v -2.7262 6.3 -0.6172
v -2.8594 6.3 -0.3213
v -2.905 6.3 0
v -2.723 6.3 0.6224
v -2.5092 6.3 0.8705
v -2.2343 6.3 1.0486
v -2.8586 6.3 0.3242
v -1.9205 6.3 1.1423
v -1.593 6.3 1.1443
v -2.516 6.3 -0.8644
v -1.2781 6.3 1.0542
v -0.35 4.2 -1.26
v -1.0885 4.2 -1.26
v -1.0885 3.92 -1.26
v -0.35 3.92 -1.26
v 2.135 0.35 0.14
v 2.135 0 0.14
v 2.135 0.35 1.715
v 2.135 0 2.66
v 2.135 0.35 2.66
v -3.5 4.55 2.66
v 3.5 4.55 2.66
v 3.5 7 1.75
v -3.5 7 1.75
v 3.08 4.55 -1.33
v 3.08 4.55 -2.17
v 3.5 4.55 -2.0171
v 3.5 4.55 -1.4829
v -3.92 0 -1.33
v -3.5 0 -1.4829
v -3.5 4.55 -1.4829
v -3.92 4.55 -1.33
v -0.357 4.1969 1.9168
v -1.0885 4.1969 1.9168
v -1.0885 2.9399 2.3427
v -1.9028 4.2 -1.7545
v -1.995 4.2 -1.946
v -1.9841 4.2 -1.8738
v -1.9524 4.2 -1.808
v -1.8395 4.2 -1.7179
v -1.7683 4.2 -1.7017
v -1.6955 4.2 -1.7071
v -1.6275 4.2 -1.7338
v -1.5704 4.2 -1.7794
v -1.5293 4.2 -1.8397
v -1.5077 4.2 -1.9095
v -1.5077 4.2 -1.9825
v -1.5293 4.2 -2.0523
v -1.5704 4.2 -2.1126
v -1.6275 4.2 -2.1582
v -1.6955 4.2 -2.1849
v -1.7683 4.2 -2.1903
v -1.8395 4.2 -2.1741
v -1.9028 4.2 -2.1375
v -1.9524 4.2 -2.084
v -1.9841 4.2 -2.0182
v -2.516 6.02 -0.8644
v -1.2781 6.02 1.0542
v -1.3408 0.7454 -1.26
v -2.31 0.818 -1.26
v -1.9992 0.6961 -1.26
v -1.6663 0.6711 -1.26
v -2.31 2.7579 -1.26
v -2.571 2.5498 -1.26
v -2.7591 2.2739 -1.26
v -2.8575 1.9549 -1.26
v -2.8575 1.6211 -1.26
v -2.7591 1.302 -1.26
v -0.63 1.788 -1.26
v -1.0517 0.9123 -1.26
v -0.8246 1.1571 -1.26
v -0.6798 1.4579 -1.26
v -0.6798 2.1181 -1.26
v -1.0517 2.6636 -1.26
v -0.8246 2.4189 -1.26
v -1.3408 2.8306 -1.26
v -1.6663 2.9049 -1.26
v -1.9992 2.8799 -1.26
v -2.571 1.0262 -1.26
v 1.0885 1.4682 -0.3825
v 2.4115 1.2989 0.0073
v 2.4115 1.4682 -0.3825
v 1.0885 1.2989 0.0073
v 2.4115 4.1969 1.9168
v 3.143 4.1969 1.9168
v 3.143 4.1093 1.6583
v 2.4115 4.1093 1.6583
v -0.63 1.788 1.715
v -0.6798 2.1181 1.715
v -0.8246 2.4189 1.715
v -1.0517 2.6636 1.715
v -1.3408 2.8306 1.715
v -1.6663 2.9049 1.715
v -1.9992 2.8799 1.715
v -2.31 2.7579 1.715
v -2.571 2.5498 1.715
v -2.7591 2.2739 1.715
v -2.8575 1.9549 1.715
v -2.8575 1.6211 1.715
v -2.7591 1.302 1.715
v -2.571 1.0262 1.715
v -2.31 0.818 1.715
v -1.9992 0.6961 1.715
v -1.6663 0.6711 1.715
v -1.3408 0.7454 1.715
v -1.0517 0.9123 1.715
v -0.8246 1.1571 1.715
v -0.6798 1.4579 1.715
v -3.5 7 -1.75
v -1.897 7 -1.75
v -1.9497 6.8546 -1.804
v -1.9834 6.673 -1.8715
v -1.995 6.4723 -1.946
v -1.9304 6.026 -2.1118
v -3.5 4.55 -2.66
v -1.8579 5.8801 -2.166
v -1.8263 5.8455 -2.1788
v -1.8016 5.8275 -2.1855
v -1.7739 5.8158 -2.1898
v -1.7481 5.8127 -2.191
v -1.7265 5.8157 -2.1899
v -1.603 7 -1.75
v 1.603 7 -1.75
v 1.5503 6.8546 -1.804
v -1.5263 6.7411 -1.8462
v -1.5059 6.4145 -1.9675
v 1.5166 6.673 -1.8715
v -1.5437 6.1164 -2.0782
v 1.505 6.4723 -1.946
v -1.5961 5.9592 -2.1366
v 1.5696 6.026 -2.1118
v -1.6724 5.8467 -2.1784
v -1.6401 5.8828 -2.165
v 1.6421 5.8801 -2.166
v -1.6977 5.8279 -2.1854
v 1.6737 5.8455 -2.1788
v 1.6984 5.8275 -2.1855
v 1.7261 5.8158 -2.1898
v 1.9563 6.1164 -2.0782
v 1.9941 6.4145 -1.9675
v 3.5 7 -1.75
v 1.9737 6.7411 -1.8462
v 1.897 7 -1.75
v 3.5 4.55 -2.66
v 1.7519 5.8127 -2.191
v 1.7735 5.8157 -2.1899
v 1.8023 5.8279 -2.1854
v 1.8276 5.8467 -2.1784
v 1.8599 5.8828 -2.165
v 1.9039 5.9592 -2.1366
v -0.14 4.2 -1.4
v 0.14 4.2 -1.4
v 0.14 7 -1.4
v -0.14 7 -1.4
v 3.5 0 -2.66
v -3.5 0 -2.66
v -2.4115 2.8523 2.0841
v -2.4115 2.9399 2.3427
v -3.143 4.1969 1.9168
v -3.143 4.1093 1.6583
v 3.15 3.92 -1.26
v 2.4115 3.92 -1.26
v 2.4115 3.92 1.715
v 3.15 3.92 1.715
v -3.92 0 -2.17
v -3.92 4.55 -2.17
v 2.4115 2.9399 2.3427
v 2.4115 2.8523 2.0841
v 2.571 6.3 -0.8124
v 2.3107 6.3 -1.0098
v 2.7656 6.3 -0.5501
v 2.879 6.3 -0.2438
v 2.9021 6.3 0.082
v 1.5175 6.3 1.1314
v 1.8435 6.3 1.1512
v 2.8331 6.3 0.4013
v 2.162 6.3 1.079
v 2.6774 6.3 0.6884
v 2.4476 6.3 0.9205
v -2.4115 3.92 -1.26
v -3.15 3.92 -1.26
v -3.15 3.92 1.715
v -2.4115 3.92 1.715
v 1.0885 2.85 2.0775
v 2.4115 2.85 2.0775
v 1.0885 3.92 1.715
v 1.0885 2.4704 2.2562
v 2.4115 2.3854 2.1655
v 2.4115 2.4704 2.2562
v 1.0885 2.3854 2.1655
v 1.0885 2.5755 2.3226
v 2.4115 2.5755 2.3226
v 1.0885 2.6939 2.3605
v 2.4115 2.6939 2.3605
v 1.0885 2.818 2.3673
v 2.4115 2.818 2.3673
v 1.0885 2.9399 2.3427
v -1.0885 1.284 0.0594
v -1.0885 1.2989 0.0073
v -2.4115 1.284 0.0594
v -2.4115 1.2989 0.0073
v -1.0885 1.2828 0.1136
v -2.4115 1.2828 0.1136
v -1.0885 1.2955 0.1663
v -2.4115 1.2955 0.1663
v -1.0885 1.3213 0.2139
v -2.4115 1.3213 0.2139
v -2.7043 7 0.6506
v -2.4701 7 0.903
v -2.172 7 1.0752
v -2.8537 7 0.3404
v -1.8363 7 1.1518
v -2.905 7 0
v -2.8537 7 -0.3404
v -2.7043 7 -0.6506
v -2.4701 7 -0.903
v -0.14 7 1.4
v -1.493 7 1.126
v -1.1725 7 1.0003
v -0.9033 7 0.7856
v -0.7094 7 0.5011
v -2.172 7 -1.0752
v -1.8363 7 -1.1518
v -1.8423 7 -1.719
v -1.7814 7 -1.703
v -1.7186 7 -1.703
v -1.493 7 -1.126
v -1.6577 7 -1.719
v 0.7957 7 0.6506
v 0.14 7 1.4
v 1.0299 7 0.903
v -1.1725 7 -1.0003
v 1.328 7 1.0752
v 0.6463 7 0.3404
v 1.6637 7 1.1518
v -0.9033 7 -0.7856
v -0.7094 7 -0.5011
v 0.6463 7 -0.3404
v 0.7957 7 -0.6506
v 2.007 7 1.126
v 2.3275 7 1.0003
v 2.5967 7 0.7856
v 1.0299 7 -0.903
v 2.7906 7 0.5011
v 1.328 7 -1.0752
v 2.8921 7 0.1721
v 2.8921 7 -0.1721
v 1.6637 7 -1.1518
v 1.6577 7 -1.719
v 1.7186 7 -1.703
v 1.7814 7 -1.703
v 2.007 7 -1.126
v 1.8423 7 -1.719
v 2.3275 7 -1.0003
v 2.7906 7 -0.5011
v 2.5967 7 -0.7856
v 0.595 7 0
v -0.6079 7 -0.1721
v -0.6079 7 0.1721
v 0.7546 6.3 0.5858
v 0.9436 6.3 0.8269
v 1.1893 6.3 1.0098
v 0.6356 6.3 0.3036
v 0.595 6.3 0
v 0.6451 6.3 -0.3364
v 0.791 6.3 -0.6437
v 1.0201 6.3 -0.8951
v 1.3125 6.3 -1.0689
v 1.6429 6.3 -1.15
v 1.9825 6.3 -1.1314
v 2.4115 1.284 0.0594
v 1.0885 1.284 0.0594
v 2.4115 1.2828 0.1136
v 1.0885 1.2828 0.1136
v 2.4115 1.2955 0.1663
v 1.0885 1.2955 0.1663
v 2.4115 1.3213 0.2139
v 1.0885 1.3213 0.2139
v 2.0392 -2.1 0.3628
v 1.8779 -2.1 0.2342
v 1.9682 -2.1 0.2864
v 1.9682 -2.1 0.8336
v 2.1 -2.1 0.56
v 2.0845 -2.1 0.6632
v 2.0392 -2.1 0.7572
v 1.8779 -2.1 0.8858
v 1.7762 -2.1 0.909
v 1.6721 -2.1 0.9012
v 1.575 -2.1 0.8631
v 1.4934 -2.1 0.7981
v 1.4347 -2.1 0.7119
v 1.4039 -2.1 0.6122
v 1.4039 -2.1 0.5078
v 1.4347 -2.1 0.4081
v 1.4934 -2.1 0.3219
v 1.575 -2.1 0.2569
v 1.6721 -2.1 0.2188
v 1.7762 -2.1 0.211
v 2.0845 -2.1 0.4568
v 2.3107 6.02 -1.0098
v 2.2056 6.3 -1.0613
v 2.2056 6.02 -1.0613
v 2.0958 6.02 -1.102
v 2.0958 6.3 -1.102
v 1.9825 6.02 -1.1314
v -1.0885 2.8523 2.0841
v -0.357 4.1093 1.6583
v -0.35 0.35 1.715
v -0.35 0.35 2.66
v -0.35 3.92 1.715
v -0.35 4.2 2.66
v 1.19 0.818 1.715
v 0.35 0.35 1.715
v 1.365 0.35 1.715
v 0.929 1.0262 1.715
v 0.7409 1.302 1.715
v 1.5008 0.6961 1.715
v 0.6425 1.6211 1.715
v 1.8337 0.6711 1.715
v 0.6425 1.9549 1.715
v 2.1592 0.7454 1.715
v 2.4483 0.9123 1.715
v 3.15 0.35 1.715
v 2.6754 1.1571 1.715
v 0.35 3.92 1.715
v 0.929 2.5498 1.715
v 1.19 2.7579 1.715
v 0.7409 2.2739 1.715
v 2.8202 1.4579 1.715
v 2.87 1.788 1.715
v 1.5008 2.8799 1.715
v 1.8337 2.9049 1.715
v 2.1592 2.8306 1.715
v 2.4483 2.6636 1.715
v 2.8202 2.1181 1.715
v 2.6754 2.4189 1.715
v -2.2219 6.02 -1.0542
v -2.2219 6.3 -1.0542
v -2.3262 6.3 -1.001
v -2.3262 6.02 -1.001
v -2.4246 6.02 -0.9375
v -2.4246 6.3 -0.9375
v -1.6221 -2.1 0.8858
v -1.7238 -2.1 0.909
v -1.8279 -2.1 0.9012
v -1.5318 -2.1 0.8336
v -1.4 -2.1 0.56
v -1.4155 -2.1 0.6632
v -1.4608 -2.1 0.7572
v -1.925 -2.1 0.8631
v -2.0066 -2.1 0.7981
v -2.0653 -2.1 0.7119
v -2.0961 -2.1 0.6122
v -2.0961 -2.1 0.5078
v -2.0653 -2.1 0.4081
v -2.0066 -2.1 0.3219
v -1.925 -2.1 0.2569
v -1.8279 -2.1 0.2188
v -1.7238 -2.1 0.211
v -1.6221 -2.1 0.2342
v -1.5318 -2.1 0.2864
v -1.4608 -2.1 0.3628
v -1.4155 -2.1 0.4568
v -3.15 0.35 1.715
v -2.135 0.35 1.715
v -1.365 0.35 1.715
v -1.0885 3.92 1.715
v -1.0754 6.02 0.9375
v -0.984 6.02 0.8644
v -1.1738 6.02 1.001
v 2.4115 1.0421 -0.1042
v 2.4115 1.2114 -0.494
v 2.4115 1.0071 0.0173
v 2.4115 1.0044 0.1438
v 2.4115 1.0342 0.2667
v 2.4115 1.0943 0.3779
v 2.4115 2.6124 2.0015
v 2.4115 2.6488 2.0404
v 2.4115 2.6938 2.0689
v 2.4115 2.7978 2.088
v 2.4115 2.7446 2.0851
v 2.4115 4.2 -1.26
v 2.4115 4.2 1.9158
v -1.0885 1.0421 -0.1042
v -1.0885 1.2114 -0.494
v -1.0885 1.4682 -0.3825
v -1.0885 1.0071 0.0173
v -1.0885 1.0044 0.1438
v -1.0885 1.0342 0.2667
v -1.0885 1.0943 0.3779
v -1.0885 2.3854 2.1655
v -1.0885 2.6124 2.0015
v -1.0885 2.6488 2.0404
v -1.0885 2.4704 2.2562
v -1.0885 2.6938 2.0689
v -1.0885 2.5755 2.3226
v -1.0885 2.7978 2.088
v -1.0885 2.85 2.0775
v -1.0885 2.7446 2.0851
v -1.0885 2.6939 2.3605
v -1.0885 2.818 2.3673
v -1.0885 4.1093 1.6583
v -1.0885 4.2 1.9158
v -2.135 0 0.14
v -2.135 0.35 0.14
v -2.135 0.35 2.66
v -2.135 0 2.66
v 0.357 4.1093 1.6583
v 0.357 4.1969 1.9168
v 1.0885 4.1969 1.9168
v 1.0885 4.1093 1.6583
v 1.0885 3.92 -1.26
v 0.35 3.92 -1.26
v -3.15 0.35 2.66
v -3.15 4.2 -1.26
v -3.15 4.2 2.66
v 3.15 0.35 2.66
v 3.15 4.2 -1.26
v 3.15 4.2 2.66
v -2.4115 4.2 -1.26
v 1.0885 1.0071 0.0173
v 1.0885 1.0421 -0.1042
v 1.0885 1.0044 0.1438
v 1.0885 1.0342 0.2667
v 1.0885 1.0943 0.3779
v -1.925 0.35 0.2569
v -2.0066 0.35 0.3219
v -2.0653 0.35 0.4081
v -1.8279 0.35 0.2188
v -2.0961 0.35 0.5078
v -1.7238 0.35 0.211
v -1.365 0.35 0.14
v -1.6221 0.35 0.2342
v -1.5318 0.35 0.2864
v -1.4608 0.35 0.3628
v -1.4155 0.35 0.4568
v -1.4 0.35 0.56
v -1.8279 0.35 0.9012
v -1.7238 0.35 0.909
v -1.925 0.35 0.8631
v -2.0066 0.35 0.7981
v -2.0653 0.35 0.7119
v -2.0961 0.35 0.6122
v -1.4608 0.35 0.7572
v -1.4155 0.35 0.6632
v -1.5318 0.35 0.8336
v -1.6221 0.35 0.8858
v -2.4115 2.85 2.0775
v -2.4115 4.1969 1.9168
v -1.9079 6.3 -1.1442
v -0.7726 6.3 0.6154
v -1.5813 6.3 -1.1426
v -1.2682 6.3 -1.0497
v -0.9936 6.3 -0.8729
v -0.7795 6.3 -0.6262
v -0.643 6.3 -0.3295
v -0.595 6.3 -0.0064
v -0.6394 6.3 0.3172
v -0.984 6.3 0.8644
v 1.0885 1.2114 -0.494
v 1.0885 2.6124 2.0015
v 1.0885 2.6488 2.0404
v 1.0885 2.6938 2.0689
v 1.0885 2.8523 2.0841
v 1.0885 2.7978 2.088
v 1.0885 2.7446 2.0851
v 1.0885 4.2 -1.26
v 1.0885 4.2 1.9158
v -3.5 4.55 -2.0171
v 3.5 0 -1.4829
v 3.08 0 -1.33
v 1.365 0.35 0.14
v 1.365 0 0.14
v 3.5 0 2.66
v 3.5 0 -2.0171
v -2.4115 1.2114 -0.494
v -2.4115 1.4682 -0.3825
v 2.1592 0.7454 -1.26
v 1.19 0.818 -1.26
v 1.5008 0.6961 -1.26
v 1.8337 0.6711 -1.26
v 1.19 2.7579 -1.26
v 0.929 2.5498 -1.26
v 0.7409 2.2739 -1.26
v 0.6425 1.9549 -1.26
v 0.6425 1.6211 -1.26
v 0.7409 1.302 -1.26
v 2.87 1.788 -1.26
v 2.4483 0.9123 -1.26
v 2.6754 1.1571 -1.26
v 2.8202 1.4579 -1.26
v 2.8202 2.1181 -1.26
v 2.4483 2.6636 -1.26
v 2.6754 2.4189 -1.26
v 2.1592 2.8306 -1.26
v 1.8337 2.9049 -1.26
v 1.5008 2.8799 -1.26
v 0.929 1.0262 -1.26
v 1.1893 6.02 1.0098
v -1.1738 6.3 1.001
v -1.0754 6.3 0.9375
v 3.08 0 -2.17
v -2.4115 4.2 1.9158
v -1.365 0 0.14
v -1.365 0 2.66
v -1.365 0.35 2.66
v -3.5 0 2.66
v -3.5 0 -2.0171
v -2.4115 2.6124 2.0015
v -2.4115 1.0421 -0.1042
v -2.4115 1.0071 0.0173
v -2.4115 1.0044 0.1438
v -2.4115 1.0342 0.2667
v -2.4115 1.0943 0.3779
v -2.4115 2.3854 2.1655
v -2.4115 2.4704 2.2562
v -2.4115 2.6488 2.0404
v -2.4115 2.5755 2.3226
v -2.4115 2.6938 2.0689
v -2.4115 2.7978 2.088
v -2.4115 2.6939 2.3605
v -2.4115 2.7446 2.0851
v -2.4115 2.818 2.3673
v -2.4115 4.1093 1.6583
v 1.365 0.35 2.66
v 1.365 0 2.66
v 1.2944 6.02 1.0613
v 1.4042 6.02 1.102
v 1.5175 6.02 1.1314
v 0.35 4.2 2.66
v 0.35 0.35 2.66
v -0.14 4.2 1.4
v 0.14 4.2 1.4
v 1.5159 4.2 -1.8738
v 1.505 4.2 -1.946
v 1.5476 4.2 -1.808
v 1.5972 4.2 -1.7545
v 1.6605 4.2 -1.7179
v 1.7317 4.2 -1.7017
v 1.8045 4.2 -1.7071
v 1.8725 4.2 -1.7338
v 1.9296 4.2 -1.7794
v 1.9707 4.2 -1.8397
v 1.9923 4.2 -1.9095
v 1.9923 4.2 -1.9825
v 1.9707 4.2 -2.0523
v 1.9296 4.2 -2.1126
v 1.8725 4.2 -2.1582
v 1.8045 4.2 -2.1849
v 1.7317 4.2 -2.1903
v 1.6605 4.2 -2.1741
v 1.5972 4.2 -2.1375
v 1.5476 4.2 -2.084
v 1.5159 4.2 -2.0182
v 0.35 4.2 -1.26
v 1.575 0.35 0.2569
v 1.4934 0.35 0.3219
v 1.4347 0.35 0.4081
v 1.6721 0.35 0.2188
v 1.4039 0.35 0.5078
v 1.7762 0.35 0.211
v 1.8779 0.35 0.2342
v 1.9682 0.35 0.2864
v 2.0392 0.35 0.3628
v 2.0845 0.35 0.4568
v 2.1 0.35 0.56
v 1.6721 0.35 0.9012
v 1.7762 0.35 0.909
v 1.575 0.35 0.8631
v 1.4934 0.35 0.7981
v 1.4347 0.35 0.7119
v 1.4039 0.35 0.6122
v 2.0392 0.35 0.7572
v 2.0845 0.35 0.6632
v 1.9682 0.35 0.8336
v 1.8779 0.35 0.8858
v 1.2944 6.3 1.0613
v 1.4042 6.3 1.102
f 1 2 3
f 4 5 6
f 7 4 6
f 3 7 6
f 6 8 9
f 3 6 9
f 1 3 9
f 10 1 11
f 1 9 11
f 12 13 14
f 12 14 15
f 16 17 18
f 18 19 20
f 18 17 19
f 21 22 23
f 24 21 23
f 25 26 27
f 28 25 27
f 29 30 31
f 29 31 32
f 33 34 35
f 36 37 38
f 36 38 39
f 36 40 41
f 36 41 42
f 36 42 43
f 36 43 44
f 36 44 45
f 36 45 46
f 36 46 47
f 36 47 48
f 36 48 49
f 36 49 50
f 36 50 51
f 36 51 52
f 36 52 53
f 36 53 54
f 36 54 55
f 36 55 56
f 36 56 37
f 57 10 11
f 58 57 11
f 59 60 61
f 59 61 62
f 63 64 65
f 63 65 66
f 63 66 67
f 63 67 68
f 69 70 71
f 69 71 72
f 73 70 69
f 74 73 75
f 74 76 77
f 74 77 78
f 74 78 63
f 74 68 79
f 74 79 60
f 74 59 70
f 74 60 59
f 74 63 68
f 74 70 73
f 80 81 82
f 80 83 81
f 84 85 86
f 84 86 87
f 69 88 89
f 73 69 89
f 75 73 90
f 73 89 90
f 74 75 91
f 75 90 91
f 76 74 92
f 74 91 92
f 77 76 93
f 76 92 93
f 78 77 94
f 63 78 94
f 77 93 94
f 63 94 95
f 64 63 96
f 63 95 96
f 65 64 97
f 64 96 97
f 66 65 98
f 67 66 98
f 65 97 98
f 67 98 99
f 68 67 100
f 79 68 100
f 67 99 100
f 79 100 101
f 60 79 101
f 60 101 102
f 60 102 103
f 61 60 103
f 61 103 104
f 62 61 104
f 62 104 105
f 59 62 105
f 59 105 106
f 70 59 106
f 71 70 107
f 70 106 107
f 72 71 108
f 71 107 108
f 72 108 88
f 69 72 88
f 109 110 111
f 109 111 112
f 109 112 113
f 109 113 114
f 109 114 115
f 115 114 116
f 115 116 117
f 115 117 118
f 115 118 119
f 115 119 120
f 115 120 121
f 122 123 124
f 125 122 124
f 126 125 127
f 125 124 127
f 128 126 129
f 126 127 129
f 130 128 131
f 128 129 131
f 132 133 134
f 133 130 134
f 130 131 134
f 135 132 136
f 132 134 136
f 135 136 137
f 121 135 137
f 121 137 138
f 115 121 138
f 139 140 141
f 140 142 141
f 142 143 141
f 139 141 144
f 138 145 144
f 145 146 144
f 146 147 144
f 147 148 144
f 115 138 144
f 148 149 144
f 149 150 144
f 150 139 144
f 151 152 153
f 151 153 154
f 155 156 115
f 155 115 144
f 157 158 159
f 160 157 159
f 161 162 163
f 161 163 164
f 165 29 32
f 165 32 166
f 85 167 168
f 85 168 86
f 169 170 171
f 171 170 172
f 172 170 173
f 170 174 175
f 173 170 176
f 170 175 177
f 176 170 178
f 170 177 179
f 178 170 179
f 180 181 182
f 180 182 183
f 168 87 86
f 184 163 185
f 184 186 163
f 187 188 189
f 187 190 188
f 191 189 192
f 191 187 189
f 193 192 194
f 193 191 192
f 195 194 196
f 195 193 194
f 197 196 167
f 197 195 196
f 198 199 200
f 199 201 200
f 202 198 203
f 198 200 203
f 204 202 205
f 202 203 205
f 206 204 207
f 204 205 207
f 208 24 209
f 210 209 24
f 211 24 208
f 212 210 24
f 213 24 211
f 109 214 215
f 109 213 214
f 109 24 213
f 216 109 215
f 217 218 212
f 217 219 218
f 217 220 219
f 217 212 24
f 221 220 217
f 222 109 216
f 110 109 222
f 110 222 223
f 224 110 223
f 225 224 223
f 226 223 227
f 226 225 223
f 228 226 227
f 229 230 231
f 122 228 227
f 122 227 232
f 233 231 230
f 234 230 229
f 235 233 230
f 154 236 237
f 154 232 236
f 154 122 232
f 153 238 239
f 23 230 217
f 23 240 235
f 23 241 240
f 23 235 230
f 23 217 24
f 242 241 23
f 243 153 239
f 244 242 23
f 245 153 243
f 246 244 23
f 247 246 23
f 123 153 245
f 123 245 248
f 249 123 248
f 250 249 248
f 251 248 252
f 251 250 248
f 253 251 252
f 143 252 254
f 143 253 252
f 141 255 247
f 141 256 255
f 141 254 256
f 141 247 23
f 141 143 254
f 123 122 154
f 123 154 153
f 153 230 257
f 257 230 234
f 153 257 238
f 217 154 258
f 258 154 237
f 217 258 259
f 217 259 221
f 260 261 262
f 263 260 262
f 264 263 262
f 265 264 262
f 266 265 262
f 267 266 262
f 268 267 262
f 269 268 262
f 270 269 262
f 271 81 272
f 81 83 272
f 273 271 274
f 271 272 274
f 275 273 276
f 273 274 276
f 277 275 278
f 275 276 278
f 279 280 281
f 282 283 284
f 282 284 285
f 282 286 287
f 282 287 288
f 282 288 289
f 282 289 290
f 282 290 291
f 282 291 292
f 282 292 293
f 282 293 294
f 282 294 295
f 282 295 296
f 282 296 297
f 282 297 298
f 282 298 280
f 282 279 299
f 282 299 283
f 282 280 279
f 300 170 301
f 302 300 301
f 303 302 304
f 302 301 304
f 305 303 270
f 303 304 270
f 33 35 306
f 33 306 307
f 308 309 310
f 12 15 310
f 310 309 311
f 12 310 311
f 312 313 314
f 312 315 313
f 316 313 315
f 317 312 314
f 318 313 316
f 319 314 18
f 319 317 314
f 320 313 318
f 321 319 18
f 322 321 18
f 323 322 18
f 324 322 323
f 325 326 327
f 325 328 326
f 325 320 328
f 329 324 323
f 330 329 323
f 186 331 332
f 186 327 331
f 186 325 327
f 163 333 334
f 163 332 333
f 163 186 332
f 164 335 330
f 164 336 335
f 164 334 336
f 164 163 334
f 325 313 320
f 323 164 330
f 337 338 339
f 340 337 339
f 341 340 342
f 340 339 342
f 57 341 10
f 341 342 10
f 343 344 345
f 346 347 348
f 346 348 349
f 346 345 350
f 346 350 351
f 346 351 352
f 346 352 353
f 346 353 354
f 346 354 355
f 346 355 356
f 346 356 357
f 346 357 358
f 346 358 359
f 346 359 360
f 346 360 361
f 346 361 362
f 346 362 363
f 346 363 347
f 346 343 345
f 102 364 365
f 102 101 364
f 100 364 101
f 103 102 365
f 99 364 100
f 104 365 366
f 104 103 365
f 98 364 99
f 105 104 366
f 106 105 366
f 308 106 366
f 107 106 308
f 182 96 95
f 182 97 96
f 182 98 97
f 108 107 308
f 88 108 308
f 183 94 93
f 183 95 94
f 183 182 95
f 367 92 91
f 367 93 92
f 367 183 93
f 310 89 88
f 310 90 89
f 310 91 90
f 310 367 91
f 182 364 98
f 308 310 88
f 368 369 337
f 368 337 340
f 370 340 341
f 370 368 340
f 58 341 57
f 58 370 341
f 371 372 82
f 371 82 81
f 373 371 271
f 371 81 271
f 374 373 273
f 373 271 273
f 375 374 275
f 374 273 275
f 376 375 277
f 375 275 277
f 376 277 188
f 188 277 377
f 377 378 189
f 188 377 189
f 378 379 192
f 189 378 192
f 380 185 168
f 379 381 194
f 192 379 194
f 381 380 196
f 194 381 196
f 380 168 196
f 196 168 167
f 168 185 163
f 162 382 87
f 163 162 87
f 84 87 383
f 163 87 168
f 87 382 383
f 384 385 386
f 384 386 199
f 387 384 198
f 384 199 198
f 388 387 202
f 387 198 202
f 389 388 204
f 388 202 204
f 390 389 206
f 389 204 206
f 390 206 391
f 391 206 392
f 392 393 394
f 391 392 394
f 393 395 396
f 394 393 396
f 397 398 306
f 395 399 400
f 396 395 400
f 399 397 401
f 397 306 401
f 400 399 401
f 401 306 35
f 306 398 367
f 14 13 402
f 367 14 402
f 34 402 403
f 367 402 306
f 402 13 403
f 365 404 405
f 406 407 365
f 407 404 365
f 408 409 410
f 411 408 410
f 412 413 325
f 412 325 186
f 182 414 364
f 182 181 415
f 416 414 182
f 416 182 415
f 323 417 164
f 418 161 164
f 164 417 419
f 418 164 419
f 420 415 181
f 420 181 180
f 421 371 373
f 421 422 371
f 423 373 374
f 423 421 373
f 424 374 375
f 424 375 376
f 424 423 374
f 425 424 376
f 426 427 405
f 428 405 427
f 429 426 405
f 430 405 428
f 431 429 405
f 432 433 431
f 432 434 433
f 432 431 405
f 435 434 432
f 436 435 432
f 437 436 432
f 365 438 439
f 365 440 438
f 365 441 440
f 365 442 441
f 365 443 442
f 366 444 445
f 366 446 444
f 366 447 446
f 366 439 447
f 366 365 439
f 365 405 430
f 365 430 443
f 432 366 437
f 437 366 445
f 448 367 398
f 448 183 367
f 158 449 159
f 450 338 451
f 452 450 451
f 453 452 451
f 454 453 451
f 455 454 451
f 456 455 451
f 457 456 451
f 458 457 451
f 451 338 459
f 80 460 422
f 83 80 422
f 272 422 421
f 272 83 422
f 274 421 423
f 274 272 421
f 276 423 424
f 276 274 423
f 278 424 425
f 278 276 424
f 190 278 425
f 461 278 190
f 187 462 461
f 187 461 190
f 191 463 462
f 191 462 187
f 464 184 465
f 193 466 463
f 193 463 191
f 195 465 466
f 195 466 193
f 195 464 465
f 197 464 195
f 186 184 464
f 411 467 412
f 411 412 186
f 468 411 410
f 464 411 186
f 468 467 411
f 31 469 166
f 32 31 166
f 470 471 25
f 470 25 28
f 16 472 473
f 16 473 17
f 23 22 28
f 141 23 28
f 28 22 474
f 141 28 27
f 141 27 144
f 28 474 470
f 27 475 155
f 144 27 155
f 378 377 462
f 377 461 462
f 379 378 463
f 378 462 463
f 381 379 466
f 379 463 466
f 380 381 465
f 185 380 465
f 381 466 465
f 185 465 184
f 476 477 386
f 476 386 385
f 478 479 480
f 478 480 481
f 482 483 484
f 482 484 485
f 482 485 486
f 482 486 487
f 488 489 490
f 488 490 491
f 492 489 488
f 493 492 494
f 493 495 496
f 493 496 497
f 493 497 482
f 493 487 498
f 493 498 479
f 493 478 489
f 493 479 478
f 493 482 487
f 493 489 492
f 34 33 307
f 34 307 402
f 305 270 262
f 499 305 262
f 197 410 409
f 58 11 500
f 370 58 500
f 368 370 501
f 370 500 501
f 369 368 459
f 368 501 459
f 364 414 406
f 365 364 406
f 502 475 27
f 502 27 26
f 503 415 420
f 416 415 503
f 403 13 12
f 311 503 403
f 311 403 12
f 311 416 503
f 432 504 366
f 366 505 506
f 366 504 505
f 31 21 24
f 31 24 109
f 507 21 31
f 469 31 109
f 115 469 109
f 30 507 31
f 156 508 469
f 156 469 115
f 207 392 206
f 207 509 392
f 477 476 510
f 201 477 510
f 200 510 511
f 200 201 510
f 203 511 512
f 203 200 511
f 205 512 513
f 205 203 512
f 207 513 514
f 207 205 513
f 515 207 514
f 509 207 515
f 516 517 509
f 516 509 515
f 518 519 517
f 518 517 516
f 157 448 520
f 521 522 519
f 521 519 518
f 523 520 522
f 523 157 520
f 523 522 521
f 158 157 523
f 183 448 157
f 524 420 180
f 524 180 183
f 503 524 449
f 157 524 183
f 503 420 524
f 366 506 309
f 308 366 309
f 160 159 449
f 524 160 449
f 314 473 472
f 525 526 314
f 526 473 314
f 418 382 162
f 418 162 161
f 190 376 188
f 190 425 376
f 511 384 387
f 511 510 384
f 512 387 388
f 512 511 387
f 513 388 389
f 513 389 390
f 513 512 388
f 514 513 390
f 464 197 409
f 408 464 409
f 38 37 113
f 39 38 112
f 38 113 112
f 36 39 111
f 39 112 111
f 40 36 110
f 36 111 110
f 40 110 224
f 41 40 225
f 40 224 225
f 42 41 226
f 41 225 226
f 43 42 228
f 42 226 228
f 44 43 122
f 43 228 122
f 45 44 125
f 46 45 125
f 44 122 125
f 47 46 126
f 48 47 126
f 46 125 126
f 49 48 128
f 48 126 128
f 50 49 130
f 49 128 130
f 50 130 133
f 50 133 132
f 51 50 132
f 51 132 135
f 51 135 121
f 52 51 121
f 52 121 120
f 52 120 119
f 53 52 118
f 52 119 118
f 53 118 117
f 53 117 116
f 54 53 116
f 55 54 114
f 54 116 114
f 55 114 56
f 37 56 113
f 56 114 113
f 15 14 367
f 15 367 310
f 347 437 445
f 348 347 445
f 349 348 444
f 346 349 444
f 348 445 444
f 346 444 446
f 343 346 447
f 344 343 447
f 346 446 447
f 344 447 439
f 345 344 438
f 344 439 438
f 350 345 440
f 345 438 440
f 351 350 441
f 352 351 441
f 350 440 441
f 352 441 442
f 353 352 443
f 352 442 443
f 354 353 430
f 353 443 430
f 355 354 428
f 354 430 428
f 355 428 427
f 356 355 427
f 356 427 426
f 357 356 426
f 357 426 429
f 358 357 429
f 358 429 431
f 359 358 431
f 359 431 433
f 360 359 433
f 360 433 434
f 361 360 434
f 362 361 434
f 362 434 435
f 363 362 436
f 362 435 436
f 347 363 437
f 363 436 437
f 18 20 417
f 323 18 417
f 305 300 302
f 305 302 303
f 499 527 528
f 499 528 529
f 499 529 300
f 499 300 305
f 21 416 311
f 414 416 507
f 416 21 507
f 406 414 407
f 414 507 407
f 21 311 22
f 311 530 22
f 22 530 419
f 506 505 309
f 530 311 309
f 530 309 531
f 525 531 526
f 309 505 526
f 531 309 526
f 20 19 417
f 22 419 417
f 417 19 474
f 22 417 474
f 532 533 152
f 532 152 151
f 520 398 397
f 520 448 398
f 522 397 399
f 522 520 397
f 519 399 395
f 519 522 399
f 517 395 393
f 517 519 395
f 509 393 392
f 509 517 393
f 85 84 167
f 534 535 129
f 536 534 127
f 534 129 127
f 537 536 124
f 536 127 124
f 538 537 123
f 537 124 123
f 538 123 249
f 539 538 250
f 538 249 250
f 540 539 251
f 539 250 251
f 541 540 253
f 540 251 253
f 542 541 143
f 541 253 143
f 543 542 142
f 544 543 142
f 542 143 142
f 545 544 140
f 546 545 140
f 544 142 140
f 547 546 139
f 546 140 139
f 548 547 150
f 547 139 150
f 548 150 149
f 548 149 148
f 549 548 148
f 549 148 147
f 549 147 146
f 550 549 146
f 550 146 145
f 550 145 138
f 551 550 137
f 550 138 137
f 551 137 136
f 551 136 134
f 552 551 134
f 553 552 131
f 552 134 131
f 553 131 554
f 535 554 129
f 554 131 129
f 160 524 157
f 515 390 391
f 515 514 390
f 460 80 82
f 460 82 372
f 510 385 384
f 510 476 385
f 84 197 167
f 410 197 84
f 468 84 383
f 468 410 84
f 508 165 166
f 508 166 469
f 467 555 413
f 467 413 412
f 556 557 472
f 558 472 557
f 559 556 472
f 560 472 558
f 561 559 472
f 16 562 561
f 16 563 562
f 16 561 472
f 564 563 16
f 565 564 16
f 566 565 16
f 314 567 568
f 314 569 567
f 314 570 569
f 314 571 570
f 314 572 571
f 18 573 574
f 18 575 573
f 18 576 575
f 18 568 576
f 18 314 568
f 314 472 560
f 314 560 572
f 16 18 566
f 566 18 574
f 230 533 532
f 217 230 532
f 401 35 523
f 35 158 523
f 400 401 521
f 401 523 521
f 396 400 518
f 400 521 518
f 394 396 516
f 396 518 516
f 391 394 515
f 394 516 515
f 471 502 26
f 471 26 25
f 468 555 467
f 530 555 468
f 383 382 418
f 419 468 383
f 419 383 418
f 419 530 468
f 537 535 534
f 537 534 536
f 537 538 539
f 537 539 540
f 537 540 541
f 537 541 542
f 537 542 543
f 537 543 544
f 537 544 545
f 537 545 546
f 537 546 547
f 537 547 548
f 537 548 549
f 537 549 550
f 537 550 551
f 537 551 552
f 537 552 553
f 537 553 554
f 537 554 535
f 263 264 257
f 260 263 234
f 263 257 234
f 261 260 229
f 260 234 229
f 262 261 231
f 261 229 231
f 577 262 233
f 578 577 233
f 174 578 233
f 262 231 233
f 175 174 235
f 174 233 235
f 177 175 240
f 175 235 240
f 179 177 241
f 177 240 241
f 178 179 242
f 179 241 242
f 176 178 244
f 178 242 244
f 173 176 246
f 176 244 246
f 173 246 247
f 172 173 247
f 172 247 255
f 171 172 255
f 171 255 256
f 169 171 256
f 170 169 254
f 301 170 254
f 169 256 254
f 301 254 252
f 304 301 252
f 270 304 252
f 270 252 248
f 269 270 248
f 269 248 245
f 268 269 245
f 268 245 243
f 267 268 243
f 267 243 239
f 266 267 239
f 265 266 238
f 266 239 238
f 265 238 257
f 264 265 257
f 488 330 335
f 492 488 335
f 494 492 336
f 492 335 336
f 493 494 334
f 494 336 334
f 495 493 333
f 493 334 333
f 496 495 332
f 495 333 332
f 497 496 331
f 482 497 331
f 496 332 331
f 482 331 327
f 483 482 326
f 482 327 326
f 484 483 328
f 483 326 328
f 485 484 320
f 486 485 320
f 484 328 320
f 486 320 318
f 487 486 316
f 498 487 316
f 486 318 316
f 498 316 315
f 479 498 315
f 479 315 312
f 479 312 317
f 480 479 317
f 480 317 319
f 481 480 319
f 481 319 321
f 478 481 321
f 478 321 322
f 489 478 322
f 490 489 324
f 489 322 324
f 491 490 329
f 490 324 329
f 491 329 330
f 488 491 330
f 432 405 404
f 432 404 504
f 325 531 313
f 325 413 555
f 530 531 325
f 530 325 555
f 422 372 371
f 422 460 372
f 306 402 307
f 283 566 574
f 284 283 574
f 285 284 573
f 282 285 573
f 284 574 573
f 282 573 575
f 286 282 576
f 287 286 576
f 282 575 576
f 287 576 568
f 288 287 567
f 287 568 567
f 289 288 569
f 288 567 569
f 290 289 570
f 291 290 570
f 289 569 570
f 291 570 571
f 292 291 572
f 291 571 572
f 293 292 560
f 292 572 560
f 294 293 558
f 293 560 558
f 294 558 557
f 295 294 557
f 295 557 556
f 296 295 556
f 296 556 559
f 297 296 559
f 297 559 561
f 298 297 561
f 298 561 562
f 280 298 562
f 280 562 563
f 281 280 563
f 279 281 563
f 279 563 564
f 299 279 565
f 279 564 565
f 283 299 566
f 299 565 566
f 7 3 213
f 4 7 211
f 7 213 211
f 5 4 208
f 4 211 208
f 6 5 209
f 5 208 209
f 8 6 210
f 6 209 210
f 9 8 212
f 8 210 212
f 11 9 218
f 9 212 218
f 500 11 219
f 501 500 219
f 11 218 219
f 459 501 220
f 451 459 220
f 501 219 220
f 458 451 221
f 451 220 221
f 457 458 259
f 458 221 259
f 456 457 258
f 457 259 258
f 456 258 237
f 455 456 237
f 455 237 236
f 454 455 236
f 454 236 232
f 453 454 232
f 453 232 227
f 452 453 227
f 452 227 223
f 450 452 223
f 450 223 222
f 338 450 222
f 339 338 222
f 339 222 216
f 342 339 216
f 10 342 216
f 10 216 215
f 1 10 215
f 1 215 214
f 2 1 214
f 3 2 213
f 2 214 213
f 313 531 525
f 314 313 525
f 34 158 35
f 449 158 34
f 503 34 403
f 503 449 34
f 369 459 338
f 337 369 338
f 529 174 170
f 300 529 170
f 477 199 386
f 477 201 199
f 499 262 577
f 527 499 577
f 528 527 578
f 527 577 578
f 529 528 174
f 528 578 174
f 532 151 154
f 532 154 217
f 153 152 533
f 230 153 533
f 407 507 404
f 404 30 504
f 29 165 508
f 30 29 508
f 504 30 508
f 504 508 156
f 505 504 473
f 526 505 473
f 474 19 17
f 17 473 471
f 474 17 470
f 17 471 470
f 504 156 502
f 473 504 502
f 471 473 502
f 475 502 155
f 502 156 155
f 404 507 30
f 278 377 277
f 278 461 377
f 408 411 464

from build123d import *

# Parameters (mm, degrees)
SKETCH1_W               = 10
SKETCH1_H               = 7.6
EXTRUDE1_DEPTH          = 10
SKETCH2_OUTSIDE_W       = 12.81
SKETCH2_OUTSIDE_H       = 15.21
CUT_EXTRUDE1_DEPTH      = 6
CUT_EXTRUDE1_DEPTH_BACK = 6
SKETCH3_R               = 1.65
SKETCH3_R_2             = 0.35
SKETCH3_W               = 0.4
SKETCH3_H               = 4
CUT_EXTRUDE2_DEPTH      = 4
SKETCH4_W               = 4
SKETCH4_H               = 5.5
CUT_EXTRUDE3_DEPTH      = 5.6
SKETCH5_W               = 4
SKETCH5_H               = 5.1
EXTRUDE2_DEPTH          = 4.25
SKETCH6_R               = 1.6
CUT_EXTRUDE4_DEPTH      = 4.25
EXTRUDE3_DEPTH          = 6.5
CUT_EXTRUDE5_DEPTH      = 6.5
SKETCH10_W              = 1.1
SKETCH10_H              = 0.5
CUT_EXTRUDE6_DEPTH      = 3.6
SKETCH11_R              = 0.5
EXTRUDE4_DEPTH          = 3.5
SKETCH12_R              = 1.65
EXTRUDE5_DEPTH          = 3
CUT_EXTRUDE7_DEPTH      = 0.4
EXTRUDE6_DEPTH          = 0.945
EXTRUDE9_DEPTH          = 0.39
LPATTERN1_COUNT         = 2
LPATTERN1_PITCH         = 5
FILLET1_R               = 0.3
FILLET2_R               = 0.7
SCALE1_SCALE            = 0.7


with BuildPart() as part:
    # Sketch1 → Extrude1 (new body)
    with BuildSketch(Plane(origin=(0, 0, 0), x_dir=(1, 0, 0), z_dir=(0, 1, 0))):
        Rectangle(SKETCH1_W, SKETCH1_H)
    extrude(amount=EXTRUDE1_DEPTH)

    # Sketch2 outside → Cut-Extrude1 (cut, two sides)
    with BuildSketch(Plane(origin=(0, 0, 0), x_dir=(0, 0, -1), z_dir=(1, 0, 0))) as cut_extrude1_sk:
        with Locations((0, 5)):
            Rectangle(SKETCH2_OUTSIDE_W, SKETCH2_OUTSIDE_H)
        Polygon((2.5, 10), (3.8, 6.5), (3.8, 0), (-3.8, 0), (-3.8, 6.5), (-2.5, 10), align=None, mode=Mode.SUBTRACT)
    extrude(amount=CUT_EXTRUDE1_DEPTH, mode=Mode.SUBTRACT)
    extrude(cut_extrude1_sk.sketch, amount=-CUT_EXTRUDE1_DEPTH_BACK, mode=Mode.SUBTRACT)

    # Sketch3 → Cut-Extrude2 (cut)
    with BuildSketch(Plane(origin=(0, 10, 0), x_dir=(-1, 0, 0), z_dir=(0, 1, 0))):
        with Locations((2.5, 0)):
            Circle(SKETCH3_R)
        with Locations((-2.5, 0)):
            Circle(SKETCH3_R)
        with Locations((2.5, -2.78)):
            Circle(SKETCH3_R_2)
        with Locations((-2.5, -2.78)):
            Circle(SKETCH3_R_2)
        Rectangle(SKETCH3_W, SKETCH3_H)
    extrude(amount=-CUT_EXTRUDE2_DEPTH, mode=Mode.SUBTRACT)

    # Sketch4 → Cut-Extrude3 (cut)
    with BuildSketch(Plane.XY.offset(3.8)):
        with Locations((-2.5, 3.25)):
            Rectangle(SKETCH4_W, SKETCH4_H)
        with Locations((2.5, 3.25)):
            Rectangle(SKETCH4_W, SKETCH4_H)
    extrude(amount=-CUT_EXTRUDE3_DEPTH, mode=Mode.SUBTRACT)

    # Sketch5 → Extrude2 (add)
    with BuildSketch(Plane.XY.offset(-1.8)):
        with Locations((-2.5, 3.05)):
            Rectangle(SKETCH5_W, SKETCH5_H)
        with Locations((2.5, 3.05)):
            Rectangle(SKETCH5_W, SKETCH5_H)
    extrude(amount=EXTRUDE2_DEPTH)

    # Sketch6 → Cut-Extrude4 (cut)
    with BuildSketch(Plane.XY.offset(2.45)):
        with Locations((-2.5, 2.554263468)):
            Circle(SKETCH6_R)
        with Locations((2.5, 2.554263468)):
            Circle(SKETCH6_R)
    extrude(amount=-CUT_EXTRUDE4_DEPTH, mode=Mode.SUBTRACT)

    # Sketch7 → Extrude3 (add)
    with BuildSketch(Plane(origin=(0, 0, 0), x_dir=(1, 0, 0), z_dir=(0, 1, 0))):
        Polygon((-5.6, 3.1), (-5, 2.881617859), (-5, 2.118382141), (-5.6, 1.9), align=None)
    extrude(amount=EXTRUDE3_DEPTH)

    # Sketch9 → Cut-Extrude5 (cut)
    with BuildSketch(Plane(origin=(0, 0, 0), x_dir=(1, 0, 0), z_dir=(0, 1, 0))):
        Polygon((5, 2.881617859), (4.4, 3.1), (4.4, 1.9), (5, 2.118382141), align=None)
    extrude(amount=CUT_EXTRUDE5_DEPTH, mode=Mode.SUBTRACT)

    # Sketch10 → Cut-Extrude6 (cut)
    with BuildSketch(Plane.XY.offset(3.8)):
        with Locations((-2.5, 0.25)):
            Rectangle(SKETCH10_W, SKETCH10_H)
        with Locations((2.5, 0.25)):
            Rectangle(SKETCH10_W, SKETCH10_H)
    extrude(amount=-CUT_EXTRUDE6_DEPTH, mode=Mode.SUBTRACT)

    # Sketch11 → Extrude4 (add)
    with BuildSketch(Plane.XZ.offset(-0.5)):
        with Locations((-2.5, 0.8)):
            Circle(SKETCH11_R)
        with Locations((2.5, 0.8)):
            Circle(SKETCH11_R)
    extrude(amount=EXTRUDE4_DEPTH)

    # Sketch12 → Extrude5 (add)
    with BuildSketch(Plane.XZ.offset(-6)):
        with Locations((2.5, 0)):
            Circle(SKETCH12_R)
        with Locations((-2.5, 0)):
            Circle(SKETCH12_R)
    extrude(amount=-EXTRUDE5_DEPTH)

    # Sketch13 → Cut-Extrude7 (cut)
    with BuildSketch(Plane(origin=(0, 9, 0), x_dir=(-1, 0, 0), z_dir=(0, 1, 0))):
        with BuildLine():
            Line((3.594307251, -1.234905519), (1.825829895, 1.505986278))
            ThreePointArc((1.825829895, 1.505986278), (1.605433494, 1.386452583), (1.405692749, 1.234905519))
            Line((1.405692749, 1.234905519), (3.174170105, -1.505986278))
            ThreePointArc((3.174170105, -1.505986278), (3.394566506, -1.386452583), (3.594307251, -1.234905519))
        make_face()
        with BuildLine():
            Line((-2.83217089, -1.616218581), (-1.698971441, 1.44251629))
            ThreePointArc((-1.698971441, 1.44251629), (-1.926782442, 1.54723031), (-2.16782911, 1.616218581))
            Line((-2.16782911, 1.616218581), (-3.301028559, -1.44251629))
            ThreePointArc((-3.301028559, -1.44251629), (-3.073217558, -1.54723031), (-2.83217089, -1.616218581))
        make_face()
    extrude(amount=-CUT_EXTRUDE7_DEPTH, mode=Mode.SUBTRACT)

    # Sketch14 → Extrude6 (add, symmetric)
    with BuildSketch(Plane.ZY.offset(2.5)):
        Polygon((2.45, 5.6), (3.03887637, 3.861674443), (0.167170254, 1.787608865), (-0.546359637, 2.097431054), (-0.705673534, 1.730526322), (0.216750724, 1.33), (3.512480259, 3.710312924), (2.736824279, 6), (-1.8, 6), (-1.8, 5.6), align=None)
    extrude6 = extrude(amount=EXTRUDE6_DEPTH, both=True)

    # Sketch15 → Extrude9 (add)
    with BuildSketch(Plane(origin=(0, 1.449355072, 4.278403908), x_dir=(1, 0, 0), z_dir=(0, 0.320850379, 0.947129893))):
        Polygon((-1.555, 4.8), (-1.555, 2.903968921), (-0.51, 4.8), align=None)
        Polygon((-3.445, 4.8), (-3.445, 2.903968921), (-4.49, 4.8), align=None)
    extrude9 = extrude(amount=-EXTRUDE9_DEPTH)

    # LPattern1: Extrude6, Extrude9 ×2
    with Locations(*[(i * LPATTERN1_PITCH, 0, 0) for i in range(1, LPATTERN1_COUNT)]):
        add(extrude6)
        add(extrude9)

    # Fillet1
    fillet1_edges = [part.edges().sort_by_distance(p)[0] for p in [
        (-2.5, 3.861674443, 3.03887637),
        (-2.5, 1.787608865, 0.167170254),
        (2.5, 3.861674443, 3.03887637),
        (2.5, 1.787608865, 0.167170254),
    ]]
    fillet(fillet1_edges, radius=FILLET1_R)

    # Fillet2
    fillet2_edges = [part.edges().sort_by_distance(p)[0] for p in [
        (-2.5, 3.710312924, 3.512480259),
        (-2.5, 1.33, 0.216750724),
        (2.5, 1.33, 0.216750724),
        (2.5, 3.710312924, 3.512480259),
    ]]
    fillet(fillet2_edges, radius=FILLET2_R)


with BuildPart() as part_1:
    # Scale1: scaled about (0, 0, 0)
    add(part.part.scale(SCALE1_SCALE))


solid = part_1.part
